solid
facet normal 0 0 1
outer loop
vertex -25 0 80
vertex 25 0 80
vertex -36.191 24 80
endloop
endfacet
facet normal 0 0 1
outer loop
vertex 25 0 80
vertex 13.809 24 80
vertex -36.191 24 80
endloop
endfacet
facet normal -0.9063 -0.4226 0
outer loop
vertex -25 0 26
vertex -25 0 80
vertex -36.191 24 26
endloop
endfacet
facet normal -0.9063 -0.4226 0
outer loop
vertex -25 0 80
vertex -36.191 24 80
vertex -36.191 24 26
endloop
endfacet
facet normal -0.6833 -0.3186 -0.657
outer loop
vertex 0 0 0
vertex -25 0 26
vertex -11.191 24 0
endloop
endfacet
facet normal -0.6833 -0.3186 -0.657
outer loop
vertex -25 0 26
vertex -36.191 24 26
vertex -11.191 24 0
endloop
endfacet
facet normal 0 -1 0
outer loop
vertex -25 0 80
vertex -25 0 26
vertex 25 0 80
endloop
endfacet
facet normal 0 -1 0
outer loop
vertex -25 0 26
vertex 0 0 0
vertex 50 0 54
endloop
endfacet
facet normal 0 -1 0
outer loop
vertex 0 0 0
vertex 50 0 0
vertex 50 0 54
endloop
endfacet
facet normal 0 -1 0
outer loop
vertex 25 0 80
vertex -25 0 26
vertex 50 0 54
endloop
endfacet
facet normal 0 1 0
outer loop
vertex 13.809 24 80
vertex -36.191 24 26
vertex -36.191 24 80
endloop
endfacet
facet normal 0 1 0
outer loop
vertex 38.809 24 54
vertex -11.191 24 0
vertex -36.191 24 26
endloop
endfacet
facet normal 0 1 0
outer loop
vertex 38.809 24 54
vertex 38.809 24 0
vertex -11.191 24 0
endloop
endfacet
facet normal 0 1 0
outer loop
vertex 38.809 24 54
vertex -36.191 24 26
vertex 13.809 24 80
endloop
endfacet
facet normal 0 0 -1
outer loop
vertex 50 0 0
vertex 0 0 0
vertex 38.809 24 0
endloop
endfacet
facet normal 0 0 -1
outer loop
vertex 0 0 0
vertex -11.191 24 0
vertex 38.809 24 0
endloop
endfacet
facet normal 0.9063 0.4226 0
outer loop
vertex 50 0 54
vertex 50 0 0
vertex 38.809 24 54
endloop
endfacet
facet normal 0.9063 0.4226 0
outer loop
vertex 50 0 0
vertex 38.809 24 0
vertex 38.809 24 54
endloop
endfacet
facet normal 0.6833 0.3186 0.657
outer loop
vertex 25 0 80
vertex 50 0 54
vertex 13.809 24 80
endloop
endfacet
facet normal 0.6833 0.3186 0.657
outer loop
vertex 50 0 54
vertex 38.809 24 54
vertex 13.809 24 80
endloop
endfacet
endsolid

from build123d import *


with BuildPart() as part:
    # Sketch1 → Loft1 section 0
    with BuildSketch(Plane(origin=(0, 0, 0), x_dir=(1, 0, 0), z_dir=(0, 1, 0))):
        Polygon((0, 0), (50, 0), (50, -54), (25, -80), (-25, -80), (-25, -26), align=None)
    # Sketch4 → Loft1 section 1
    with BuildSketch(Plane(origin=(0, 24, 0), x_dir=(-1, 0, 0), z_dir=(0, 1, 0))):
        Polygon((-38.808616204, 0), (-38.808616204, 54), (-13.808616204, 80), (36.191383796, 80), (36.191383796, 26), (11.191383796, 0), align=None)
    loft()


solid = part.part
